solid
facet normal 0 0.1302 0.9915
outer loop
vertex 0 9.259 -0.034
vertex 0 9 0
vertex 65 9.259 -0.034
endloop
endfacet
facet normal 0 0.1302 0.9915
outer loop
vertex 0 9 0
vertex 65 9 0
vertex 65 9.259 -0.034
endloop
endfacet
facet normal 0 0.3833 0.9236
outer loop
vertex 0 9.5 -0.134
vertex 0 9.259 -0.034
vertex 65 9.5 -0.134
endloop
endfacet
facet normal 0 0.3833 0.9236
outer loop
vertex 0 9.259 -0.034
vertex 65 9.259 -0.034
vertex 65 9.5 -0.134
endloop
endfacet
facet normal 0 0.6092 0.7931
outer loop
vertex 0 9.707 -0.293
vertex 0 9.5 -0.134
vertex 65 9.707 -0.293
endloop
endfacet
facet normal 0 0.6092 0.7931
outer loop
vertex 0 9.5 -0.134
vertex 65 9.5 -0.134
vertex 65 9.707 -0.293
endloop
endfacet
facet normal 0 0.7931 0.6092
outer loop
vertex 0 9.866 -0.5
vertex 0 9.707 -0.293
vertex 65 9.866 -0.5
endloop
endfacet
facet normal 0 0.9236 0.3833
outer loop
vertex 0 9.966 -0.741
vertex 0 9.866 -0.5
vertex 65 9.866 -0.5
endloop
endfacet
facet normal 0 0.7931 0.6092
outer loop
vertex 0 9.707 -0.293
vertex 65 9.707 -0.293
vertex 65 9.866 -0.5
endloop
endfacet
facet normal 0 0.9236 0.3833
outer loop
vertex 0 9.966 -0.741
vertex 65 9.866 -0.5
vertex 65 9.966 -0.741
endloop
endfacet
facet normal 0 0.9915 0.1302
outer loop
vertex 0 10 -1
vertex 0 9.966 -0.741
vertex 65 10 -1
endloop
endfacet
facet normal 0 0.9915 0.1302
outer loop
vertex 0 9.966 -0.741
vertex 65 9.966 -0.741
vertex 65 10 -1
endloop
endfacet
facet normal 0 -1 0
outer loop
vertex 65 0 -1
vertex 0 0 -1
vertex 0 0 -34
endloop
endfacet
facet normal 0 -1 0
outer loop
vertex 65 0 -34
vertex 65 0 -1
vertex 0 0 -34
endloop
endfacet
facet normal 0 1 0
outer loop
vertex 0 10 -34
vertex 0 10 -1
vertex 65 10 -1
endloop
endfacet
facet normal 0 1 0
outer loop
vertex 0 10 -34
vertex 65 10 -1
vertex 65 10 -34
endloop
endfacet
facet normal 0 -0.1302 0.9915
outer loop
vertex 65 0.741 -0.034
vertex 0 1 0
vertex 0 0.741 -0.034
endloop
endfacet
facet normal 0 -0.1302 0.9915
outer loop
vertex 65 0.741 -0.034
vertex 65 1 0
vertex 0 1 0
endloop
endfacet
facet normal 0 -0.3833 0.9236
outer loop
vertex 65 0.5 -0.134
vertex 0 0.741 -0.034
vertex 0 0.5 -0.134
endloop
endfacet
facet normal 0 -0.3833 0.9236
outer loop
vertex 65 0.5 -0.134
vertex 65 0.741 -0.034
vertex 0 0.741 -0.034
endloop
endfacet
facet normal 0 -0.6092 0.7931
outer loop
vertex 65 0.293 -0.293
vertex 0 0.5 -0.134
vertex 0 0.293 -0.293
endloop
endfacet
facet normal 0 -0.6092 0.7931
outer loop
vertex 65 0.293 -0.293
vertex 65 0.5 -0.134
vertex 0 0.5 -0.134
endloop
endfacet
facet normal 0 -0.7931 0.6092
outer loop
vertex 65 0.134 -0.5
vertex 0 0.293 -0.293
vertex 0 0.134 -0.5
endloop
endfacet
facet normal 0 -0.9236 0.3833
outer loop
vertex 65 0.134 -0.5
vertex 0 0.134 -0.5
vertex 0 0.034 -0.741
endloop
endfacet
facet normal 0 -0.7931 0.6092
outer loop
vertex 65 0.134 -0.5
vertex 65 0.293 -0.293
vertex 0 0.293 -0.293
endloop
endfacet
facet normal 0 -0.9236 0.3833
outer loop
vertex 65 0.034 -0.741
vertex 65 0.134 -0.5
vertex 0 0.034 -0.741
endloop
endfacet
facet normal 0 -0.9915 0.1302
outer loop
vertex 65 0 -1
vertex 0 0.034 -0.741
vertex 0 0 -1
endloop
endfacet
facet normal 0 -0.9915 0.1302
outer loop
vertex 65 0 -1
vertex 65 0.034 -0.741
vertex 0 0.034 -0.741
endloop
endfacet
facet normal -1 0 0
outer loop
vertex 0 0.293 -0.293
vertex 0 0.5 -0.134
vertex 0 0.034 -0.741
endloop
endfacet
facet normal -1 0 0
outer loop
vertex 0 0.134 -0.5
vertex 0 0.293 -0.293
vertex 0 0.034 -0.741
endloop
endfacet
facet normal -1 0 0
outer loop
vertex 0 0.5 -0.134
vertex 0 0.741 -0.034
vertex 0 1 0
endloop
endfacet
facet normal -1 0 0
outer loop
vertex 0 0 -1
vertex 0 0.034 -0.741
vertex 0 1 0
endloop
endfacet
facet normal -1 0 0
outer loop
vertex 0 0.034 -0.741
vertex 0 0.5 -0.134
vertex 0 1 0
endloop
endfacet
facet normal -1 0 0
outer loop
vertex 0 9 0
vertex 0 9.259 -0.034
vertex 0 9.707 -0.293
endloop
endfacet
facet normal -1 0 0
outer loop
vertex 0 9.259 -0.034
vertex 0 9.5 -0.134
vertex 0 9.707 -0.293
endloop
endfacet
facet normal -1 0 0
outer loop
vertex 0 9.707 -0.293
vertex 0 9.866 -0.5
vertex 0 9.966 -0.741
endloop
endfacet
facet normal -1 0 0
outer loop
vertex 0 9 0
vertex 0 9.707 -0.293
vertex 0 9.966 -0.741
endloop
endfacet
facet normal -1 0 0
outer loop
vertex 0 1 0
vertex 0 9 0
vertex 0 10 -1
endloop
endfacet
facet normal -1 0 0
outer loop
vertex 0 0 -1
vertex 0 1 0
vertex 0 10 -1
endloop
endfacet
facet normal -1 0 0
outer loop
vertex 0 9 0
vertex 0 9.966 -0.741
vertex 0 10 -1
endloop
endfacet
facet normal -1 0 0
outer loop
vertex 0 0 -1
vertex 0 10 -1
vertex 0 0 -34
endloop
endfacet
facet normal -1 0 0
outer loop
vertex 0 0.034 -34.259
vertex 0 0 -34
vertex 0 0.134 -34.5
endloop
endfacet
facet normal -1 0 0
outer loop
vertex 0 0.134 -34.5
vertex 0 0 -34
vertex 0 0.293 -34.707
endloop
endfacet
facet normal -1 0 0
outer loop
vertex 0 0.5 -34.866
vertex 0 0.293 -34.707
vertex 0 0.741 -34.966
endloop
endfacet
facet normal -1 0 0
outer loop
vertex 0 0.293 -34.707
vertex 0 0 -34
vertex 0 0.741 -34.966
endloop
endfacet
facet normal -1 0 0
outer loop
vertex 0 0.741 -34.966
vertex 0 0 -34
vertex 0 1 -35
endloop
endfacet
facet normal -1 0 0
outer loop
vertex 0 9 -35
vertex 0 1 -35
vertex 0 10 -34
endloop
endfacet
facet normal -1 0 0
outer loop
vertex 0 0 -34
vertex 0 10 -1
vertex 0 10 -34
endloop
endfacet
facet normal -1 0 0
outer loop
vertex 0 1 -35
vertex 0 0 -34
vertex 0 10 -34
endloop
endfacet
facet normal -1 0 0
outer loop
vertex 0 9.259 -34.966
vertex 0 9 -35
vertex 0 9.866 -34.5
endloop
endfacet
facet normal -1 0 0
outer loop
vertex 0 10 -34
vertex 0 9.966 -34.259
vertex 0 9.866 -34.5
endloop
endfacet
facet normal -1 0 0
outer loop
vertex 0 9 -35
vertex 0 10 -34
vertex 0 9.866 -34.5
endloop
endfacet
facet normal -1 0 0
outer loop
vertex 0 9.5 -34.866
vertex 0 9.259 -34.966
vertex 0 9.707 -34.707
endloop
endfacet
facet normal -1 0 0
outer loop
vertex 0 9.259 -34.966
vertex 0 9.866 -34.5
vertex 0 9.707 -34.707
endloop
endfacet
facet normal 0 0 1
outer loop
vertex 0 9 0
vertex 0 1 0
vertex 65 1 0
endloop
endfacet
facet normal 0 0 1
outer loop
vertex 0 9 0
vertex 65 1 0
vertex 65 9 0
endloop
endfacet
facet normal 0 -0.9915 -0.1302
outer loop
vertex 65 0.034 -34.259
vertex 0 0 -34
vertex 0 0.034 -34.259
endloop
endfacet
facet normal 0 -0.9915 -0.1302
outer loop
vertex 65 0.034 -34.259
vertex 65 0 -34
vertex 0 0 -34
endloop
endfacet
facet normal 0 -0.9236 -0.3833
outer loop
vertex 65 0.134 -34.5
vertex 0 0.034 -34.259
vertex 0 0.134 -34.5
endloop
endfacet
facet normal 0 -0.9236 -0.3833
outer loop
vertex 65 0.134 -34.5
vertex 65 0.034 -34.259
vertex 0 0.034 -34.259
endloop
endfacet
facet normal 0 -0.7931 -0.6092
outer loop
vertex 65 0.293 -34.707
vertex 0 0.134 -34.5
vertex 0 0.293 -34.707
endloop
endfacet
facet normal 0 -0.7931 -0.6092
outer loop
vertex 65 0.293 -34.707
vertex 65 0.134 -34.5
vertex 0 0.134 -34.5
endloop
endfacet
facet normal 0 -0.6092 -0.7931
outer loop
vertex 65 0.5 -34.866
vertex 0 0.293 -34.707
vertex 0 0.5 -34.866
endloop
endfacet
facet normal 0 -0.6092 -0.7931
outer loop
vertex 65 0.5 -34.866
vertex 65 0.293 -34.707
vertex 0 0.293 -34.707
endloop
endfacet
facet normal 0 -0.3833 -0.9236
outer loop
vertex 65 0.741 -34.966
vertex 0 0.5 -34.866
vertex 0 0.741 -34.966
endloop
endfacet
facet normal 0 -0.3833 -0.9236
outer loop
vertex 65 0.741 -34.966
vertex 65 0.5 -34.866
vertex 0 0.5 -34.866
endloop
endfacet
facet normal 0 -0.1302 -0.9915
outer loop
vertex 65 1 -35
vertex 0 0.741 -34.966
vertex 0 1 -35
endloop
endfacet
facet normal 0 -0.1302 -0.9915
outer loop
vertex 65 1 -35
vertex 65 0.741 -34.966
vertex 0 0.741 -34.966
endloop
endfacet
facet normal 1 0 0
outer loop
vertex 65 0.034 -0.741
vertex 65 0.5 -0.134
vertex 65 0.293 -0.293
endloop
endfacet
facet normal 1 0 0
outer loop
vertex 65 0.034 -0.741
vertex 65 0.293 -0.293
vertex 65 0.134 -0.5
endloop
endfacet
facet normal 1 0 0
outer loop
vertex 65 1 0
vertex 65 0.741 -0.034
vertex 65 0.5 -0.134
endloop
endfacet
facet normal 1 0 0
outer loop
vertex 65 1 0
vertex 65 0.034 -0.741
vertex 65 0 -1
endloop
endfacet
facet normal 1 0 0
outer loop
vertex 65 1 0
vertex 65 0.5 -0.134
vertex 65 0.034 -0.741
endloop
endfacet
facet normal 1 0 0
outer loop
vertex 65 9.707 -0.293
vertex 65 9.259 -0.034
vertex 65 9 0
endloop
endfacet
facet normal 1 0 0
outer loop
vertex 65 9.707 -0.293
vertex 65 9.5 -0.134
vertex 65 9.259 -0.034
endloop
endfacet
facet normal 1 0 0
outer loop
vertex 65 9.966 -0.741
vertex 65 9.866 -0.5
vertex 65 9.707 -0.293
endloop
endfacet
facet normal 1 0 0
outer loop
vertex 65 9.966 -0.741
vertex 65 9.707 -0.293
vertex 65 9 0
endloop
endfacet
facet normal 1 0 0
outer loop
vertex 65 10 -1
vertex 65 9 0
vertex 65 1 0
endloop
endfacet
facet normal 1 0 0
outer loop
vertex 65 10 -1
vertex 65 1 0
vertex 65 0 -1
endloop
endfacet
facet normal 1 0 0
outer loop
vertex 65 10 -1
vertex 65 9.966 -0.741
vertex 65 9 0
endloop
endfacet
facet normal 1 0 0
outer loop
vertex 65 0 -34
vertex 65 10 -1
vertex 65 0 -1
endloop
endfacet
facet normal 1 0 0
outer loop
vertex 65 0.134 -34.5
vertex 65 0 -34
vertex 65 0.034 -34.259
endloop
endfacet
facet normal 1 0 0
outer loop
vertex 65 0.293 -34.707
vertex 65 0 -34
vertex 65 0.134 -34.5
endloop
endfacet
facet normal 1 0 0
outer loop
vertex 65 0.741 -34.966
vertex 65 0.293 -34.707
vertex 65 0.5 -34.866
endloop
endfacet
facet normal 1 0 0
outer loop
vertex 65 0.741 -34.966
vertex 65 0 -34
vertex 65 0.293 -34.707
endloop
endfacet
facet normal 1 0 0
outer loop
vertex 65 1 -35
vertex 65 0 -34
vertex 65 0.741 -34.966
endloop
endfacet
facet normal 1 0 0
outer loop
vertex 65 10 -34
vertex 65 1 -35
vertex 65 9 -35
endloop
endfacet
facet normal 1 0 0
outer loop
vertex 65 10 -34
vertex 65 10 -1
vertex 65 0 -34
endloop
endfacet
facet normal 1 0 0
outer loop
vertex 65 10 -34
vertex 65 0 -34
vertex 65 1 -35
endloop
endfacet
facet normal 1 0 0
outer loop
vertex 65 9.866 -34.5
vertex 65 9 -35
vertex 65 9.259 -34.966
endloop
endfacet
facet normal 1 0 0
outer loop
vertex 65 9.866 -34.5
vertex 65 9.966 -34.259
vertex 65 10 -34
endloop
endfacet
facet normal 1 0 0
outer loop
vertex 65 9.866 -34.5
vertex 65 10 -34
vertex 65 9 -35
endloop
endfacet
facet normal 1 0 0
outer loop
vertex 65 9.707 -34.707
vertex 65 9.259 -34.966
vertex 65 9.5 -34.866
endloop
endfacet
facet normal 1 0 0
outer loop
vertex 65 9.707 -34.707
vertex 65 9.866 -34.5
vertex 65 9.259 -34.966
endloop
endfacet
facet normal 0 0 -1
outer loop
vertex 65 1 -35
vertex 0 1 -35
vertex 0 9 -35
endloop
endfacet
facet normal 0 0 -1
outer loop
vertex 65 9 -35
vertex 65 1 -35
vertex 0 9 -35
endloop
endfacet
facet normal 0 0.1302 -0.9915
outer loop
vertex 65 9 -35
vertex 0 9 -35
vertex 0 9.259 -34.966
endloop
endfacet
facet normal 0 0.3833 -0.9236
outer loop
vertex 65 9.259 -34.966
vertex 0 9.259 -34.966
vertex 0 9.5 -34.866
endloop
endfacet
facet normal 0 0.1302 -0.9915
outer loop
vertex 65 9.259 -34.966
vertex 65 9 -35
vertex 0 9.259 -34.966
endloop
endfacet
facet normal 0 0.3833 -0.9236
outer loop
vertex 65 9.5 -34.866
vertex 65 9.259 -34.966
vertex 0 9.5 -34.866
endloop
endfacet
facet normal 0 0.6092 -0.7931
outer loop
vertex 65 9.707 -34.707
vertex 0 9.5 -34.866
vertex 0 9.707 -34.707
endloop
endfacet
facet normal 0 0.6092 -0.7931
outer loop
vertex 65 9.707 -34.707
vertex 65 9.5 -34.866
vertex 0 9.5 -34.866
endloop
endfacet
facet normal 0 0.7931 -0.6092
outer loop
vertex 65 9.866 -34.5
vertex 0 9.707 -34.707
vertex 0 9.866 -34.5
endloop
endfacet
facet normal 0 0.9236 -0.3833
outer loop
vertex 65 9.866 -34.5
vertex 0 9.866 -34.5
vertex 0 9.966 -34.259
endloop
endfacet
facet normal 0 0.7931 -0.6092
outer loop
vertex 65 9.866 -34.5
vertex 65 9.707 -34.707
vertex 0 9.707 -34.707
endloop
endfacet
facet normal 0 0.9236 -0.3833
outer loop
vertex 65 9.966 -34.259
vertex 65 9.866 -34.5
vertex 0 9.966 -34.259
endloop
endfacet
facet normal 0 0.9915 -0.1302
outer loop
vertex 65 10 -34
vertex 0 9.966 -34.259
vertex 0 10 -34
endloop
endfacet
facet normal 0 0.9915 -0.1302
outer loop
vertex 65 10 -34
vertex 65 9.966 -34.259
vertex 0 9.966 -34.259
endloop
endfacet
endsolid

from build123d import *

# Parameters (mm, degrees)
ESBO_O1_W                = 35
ESBO_O1_H                = 10
RESSALTO_EXTRUS_O1_DEPTH = 65
FILETE2_R                = 1


with BuildPart() as part:
    # Esboço1 → Ressalto-extrusão1 (new body)
    with BuildSketch(Plane(origin=(0, 0, 0), x_dir=(0, 0, -1), z_dir=(1, 0, 0))):
        with Locations((17.5, 5)):
            Rectangle(ESBO_O1_W, ESBO_O1_H)
    extrude(amount=RESSALTO_EXTRUS_O1_DEPTH)

    # Filete2
    filete2_edges = [part.edges().sort_by_distance(p)[0] for p in [
        (32.5, 10, 0),
        (32.5, 10, -35),
        (32.5, 0, -35),
        (32.5, 0, 0),
    ]]
    fillet(filete2_edges, radius=FILETE2_R)


solid = part.part
